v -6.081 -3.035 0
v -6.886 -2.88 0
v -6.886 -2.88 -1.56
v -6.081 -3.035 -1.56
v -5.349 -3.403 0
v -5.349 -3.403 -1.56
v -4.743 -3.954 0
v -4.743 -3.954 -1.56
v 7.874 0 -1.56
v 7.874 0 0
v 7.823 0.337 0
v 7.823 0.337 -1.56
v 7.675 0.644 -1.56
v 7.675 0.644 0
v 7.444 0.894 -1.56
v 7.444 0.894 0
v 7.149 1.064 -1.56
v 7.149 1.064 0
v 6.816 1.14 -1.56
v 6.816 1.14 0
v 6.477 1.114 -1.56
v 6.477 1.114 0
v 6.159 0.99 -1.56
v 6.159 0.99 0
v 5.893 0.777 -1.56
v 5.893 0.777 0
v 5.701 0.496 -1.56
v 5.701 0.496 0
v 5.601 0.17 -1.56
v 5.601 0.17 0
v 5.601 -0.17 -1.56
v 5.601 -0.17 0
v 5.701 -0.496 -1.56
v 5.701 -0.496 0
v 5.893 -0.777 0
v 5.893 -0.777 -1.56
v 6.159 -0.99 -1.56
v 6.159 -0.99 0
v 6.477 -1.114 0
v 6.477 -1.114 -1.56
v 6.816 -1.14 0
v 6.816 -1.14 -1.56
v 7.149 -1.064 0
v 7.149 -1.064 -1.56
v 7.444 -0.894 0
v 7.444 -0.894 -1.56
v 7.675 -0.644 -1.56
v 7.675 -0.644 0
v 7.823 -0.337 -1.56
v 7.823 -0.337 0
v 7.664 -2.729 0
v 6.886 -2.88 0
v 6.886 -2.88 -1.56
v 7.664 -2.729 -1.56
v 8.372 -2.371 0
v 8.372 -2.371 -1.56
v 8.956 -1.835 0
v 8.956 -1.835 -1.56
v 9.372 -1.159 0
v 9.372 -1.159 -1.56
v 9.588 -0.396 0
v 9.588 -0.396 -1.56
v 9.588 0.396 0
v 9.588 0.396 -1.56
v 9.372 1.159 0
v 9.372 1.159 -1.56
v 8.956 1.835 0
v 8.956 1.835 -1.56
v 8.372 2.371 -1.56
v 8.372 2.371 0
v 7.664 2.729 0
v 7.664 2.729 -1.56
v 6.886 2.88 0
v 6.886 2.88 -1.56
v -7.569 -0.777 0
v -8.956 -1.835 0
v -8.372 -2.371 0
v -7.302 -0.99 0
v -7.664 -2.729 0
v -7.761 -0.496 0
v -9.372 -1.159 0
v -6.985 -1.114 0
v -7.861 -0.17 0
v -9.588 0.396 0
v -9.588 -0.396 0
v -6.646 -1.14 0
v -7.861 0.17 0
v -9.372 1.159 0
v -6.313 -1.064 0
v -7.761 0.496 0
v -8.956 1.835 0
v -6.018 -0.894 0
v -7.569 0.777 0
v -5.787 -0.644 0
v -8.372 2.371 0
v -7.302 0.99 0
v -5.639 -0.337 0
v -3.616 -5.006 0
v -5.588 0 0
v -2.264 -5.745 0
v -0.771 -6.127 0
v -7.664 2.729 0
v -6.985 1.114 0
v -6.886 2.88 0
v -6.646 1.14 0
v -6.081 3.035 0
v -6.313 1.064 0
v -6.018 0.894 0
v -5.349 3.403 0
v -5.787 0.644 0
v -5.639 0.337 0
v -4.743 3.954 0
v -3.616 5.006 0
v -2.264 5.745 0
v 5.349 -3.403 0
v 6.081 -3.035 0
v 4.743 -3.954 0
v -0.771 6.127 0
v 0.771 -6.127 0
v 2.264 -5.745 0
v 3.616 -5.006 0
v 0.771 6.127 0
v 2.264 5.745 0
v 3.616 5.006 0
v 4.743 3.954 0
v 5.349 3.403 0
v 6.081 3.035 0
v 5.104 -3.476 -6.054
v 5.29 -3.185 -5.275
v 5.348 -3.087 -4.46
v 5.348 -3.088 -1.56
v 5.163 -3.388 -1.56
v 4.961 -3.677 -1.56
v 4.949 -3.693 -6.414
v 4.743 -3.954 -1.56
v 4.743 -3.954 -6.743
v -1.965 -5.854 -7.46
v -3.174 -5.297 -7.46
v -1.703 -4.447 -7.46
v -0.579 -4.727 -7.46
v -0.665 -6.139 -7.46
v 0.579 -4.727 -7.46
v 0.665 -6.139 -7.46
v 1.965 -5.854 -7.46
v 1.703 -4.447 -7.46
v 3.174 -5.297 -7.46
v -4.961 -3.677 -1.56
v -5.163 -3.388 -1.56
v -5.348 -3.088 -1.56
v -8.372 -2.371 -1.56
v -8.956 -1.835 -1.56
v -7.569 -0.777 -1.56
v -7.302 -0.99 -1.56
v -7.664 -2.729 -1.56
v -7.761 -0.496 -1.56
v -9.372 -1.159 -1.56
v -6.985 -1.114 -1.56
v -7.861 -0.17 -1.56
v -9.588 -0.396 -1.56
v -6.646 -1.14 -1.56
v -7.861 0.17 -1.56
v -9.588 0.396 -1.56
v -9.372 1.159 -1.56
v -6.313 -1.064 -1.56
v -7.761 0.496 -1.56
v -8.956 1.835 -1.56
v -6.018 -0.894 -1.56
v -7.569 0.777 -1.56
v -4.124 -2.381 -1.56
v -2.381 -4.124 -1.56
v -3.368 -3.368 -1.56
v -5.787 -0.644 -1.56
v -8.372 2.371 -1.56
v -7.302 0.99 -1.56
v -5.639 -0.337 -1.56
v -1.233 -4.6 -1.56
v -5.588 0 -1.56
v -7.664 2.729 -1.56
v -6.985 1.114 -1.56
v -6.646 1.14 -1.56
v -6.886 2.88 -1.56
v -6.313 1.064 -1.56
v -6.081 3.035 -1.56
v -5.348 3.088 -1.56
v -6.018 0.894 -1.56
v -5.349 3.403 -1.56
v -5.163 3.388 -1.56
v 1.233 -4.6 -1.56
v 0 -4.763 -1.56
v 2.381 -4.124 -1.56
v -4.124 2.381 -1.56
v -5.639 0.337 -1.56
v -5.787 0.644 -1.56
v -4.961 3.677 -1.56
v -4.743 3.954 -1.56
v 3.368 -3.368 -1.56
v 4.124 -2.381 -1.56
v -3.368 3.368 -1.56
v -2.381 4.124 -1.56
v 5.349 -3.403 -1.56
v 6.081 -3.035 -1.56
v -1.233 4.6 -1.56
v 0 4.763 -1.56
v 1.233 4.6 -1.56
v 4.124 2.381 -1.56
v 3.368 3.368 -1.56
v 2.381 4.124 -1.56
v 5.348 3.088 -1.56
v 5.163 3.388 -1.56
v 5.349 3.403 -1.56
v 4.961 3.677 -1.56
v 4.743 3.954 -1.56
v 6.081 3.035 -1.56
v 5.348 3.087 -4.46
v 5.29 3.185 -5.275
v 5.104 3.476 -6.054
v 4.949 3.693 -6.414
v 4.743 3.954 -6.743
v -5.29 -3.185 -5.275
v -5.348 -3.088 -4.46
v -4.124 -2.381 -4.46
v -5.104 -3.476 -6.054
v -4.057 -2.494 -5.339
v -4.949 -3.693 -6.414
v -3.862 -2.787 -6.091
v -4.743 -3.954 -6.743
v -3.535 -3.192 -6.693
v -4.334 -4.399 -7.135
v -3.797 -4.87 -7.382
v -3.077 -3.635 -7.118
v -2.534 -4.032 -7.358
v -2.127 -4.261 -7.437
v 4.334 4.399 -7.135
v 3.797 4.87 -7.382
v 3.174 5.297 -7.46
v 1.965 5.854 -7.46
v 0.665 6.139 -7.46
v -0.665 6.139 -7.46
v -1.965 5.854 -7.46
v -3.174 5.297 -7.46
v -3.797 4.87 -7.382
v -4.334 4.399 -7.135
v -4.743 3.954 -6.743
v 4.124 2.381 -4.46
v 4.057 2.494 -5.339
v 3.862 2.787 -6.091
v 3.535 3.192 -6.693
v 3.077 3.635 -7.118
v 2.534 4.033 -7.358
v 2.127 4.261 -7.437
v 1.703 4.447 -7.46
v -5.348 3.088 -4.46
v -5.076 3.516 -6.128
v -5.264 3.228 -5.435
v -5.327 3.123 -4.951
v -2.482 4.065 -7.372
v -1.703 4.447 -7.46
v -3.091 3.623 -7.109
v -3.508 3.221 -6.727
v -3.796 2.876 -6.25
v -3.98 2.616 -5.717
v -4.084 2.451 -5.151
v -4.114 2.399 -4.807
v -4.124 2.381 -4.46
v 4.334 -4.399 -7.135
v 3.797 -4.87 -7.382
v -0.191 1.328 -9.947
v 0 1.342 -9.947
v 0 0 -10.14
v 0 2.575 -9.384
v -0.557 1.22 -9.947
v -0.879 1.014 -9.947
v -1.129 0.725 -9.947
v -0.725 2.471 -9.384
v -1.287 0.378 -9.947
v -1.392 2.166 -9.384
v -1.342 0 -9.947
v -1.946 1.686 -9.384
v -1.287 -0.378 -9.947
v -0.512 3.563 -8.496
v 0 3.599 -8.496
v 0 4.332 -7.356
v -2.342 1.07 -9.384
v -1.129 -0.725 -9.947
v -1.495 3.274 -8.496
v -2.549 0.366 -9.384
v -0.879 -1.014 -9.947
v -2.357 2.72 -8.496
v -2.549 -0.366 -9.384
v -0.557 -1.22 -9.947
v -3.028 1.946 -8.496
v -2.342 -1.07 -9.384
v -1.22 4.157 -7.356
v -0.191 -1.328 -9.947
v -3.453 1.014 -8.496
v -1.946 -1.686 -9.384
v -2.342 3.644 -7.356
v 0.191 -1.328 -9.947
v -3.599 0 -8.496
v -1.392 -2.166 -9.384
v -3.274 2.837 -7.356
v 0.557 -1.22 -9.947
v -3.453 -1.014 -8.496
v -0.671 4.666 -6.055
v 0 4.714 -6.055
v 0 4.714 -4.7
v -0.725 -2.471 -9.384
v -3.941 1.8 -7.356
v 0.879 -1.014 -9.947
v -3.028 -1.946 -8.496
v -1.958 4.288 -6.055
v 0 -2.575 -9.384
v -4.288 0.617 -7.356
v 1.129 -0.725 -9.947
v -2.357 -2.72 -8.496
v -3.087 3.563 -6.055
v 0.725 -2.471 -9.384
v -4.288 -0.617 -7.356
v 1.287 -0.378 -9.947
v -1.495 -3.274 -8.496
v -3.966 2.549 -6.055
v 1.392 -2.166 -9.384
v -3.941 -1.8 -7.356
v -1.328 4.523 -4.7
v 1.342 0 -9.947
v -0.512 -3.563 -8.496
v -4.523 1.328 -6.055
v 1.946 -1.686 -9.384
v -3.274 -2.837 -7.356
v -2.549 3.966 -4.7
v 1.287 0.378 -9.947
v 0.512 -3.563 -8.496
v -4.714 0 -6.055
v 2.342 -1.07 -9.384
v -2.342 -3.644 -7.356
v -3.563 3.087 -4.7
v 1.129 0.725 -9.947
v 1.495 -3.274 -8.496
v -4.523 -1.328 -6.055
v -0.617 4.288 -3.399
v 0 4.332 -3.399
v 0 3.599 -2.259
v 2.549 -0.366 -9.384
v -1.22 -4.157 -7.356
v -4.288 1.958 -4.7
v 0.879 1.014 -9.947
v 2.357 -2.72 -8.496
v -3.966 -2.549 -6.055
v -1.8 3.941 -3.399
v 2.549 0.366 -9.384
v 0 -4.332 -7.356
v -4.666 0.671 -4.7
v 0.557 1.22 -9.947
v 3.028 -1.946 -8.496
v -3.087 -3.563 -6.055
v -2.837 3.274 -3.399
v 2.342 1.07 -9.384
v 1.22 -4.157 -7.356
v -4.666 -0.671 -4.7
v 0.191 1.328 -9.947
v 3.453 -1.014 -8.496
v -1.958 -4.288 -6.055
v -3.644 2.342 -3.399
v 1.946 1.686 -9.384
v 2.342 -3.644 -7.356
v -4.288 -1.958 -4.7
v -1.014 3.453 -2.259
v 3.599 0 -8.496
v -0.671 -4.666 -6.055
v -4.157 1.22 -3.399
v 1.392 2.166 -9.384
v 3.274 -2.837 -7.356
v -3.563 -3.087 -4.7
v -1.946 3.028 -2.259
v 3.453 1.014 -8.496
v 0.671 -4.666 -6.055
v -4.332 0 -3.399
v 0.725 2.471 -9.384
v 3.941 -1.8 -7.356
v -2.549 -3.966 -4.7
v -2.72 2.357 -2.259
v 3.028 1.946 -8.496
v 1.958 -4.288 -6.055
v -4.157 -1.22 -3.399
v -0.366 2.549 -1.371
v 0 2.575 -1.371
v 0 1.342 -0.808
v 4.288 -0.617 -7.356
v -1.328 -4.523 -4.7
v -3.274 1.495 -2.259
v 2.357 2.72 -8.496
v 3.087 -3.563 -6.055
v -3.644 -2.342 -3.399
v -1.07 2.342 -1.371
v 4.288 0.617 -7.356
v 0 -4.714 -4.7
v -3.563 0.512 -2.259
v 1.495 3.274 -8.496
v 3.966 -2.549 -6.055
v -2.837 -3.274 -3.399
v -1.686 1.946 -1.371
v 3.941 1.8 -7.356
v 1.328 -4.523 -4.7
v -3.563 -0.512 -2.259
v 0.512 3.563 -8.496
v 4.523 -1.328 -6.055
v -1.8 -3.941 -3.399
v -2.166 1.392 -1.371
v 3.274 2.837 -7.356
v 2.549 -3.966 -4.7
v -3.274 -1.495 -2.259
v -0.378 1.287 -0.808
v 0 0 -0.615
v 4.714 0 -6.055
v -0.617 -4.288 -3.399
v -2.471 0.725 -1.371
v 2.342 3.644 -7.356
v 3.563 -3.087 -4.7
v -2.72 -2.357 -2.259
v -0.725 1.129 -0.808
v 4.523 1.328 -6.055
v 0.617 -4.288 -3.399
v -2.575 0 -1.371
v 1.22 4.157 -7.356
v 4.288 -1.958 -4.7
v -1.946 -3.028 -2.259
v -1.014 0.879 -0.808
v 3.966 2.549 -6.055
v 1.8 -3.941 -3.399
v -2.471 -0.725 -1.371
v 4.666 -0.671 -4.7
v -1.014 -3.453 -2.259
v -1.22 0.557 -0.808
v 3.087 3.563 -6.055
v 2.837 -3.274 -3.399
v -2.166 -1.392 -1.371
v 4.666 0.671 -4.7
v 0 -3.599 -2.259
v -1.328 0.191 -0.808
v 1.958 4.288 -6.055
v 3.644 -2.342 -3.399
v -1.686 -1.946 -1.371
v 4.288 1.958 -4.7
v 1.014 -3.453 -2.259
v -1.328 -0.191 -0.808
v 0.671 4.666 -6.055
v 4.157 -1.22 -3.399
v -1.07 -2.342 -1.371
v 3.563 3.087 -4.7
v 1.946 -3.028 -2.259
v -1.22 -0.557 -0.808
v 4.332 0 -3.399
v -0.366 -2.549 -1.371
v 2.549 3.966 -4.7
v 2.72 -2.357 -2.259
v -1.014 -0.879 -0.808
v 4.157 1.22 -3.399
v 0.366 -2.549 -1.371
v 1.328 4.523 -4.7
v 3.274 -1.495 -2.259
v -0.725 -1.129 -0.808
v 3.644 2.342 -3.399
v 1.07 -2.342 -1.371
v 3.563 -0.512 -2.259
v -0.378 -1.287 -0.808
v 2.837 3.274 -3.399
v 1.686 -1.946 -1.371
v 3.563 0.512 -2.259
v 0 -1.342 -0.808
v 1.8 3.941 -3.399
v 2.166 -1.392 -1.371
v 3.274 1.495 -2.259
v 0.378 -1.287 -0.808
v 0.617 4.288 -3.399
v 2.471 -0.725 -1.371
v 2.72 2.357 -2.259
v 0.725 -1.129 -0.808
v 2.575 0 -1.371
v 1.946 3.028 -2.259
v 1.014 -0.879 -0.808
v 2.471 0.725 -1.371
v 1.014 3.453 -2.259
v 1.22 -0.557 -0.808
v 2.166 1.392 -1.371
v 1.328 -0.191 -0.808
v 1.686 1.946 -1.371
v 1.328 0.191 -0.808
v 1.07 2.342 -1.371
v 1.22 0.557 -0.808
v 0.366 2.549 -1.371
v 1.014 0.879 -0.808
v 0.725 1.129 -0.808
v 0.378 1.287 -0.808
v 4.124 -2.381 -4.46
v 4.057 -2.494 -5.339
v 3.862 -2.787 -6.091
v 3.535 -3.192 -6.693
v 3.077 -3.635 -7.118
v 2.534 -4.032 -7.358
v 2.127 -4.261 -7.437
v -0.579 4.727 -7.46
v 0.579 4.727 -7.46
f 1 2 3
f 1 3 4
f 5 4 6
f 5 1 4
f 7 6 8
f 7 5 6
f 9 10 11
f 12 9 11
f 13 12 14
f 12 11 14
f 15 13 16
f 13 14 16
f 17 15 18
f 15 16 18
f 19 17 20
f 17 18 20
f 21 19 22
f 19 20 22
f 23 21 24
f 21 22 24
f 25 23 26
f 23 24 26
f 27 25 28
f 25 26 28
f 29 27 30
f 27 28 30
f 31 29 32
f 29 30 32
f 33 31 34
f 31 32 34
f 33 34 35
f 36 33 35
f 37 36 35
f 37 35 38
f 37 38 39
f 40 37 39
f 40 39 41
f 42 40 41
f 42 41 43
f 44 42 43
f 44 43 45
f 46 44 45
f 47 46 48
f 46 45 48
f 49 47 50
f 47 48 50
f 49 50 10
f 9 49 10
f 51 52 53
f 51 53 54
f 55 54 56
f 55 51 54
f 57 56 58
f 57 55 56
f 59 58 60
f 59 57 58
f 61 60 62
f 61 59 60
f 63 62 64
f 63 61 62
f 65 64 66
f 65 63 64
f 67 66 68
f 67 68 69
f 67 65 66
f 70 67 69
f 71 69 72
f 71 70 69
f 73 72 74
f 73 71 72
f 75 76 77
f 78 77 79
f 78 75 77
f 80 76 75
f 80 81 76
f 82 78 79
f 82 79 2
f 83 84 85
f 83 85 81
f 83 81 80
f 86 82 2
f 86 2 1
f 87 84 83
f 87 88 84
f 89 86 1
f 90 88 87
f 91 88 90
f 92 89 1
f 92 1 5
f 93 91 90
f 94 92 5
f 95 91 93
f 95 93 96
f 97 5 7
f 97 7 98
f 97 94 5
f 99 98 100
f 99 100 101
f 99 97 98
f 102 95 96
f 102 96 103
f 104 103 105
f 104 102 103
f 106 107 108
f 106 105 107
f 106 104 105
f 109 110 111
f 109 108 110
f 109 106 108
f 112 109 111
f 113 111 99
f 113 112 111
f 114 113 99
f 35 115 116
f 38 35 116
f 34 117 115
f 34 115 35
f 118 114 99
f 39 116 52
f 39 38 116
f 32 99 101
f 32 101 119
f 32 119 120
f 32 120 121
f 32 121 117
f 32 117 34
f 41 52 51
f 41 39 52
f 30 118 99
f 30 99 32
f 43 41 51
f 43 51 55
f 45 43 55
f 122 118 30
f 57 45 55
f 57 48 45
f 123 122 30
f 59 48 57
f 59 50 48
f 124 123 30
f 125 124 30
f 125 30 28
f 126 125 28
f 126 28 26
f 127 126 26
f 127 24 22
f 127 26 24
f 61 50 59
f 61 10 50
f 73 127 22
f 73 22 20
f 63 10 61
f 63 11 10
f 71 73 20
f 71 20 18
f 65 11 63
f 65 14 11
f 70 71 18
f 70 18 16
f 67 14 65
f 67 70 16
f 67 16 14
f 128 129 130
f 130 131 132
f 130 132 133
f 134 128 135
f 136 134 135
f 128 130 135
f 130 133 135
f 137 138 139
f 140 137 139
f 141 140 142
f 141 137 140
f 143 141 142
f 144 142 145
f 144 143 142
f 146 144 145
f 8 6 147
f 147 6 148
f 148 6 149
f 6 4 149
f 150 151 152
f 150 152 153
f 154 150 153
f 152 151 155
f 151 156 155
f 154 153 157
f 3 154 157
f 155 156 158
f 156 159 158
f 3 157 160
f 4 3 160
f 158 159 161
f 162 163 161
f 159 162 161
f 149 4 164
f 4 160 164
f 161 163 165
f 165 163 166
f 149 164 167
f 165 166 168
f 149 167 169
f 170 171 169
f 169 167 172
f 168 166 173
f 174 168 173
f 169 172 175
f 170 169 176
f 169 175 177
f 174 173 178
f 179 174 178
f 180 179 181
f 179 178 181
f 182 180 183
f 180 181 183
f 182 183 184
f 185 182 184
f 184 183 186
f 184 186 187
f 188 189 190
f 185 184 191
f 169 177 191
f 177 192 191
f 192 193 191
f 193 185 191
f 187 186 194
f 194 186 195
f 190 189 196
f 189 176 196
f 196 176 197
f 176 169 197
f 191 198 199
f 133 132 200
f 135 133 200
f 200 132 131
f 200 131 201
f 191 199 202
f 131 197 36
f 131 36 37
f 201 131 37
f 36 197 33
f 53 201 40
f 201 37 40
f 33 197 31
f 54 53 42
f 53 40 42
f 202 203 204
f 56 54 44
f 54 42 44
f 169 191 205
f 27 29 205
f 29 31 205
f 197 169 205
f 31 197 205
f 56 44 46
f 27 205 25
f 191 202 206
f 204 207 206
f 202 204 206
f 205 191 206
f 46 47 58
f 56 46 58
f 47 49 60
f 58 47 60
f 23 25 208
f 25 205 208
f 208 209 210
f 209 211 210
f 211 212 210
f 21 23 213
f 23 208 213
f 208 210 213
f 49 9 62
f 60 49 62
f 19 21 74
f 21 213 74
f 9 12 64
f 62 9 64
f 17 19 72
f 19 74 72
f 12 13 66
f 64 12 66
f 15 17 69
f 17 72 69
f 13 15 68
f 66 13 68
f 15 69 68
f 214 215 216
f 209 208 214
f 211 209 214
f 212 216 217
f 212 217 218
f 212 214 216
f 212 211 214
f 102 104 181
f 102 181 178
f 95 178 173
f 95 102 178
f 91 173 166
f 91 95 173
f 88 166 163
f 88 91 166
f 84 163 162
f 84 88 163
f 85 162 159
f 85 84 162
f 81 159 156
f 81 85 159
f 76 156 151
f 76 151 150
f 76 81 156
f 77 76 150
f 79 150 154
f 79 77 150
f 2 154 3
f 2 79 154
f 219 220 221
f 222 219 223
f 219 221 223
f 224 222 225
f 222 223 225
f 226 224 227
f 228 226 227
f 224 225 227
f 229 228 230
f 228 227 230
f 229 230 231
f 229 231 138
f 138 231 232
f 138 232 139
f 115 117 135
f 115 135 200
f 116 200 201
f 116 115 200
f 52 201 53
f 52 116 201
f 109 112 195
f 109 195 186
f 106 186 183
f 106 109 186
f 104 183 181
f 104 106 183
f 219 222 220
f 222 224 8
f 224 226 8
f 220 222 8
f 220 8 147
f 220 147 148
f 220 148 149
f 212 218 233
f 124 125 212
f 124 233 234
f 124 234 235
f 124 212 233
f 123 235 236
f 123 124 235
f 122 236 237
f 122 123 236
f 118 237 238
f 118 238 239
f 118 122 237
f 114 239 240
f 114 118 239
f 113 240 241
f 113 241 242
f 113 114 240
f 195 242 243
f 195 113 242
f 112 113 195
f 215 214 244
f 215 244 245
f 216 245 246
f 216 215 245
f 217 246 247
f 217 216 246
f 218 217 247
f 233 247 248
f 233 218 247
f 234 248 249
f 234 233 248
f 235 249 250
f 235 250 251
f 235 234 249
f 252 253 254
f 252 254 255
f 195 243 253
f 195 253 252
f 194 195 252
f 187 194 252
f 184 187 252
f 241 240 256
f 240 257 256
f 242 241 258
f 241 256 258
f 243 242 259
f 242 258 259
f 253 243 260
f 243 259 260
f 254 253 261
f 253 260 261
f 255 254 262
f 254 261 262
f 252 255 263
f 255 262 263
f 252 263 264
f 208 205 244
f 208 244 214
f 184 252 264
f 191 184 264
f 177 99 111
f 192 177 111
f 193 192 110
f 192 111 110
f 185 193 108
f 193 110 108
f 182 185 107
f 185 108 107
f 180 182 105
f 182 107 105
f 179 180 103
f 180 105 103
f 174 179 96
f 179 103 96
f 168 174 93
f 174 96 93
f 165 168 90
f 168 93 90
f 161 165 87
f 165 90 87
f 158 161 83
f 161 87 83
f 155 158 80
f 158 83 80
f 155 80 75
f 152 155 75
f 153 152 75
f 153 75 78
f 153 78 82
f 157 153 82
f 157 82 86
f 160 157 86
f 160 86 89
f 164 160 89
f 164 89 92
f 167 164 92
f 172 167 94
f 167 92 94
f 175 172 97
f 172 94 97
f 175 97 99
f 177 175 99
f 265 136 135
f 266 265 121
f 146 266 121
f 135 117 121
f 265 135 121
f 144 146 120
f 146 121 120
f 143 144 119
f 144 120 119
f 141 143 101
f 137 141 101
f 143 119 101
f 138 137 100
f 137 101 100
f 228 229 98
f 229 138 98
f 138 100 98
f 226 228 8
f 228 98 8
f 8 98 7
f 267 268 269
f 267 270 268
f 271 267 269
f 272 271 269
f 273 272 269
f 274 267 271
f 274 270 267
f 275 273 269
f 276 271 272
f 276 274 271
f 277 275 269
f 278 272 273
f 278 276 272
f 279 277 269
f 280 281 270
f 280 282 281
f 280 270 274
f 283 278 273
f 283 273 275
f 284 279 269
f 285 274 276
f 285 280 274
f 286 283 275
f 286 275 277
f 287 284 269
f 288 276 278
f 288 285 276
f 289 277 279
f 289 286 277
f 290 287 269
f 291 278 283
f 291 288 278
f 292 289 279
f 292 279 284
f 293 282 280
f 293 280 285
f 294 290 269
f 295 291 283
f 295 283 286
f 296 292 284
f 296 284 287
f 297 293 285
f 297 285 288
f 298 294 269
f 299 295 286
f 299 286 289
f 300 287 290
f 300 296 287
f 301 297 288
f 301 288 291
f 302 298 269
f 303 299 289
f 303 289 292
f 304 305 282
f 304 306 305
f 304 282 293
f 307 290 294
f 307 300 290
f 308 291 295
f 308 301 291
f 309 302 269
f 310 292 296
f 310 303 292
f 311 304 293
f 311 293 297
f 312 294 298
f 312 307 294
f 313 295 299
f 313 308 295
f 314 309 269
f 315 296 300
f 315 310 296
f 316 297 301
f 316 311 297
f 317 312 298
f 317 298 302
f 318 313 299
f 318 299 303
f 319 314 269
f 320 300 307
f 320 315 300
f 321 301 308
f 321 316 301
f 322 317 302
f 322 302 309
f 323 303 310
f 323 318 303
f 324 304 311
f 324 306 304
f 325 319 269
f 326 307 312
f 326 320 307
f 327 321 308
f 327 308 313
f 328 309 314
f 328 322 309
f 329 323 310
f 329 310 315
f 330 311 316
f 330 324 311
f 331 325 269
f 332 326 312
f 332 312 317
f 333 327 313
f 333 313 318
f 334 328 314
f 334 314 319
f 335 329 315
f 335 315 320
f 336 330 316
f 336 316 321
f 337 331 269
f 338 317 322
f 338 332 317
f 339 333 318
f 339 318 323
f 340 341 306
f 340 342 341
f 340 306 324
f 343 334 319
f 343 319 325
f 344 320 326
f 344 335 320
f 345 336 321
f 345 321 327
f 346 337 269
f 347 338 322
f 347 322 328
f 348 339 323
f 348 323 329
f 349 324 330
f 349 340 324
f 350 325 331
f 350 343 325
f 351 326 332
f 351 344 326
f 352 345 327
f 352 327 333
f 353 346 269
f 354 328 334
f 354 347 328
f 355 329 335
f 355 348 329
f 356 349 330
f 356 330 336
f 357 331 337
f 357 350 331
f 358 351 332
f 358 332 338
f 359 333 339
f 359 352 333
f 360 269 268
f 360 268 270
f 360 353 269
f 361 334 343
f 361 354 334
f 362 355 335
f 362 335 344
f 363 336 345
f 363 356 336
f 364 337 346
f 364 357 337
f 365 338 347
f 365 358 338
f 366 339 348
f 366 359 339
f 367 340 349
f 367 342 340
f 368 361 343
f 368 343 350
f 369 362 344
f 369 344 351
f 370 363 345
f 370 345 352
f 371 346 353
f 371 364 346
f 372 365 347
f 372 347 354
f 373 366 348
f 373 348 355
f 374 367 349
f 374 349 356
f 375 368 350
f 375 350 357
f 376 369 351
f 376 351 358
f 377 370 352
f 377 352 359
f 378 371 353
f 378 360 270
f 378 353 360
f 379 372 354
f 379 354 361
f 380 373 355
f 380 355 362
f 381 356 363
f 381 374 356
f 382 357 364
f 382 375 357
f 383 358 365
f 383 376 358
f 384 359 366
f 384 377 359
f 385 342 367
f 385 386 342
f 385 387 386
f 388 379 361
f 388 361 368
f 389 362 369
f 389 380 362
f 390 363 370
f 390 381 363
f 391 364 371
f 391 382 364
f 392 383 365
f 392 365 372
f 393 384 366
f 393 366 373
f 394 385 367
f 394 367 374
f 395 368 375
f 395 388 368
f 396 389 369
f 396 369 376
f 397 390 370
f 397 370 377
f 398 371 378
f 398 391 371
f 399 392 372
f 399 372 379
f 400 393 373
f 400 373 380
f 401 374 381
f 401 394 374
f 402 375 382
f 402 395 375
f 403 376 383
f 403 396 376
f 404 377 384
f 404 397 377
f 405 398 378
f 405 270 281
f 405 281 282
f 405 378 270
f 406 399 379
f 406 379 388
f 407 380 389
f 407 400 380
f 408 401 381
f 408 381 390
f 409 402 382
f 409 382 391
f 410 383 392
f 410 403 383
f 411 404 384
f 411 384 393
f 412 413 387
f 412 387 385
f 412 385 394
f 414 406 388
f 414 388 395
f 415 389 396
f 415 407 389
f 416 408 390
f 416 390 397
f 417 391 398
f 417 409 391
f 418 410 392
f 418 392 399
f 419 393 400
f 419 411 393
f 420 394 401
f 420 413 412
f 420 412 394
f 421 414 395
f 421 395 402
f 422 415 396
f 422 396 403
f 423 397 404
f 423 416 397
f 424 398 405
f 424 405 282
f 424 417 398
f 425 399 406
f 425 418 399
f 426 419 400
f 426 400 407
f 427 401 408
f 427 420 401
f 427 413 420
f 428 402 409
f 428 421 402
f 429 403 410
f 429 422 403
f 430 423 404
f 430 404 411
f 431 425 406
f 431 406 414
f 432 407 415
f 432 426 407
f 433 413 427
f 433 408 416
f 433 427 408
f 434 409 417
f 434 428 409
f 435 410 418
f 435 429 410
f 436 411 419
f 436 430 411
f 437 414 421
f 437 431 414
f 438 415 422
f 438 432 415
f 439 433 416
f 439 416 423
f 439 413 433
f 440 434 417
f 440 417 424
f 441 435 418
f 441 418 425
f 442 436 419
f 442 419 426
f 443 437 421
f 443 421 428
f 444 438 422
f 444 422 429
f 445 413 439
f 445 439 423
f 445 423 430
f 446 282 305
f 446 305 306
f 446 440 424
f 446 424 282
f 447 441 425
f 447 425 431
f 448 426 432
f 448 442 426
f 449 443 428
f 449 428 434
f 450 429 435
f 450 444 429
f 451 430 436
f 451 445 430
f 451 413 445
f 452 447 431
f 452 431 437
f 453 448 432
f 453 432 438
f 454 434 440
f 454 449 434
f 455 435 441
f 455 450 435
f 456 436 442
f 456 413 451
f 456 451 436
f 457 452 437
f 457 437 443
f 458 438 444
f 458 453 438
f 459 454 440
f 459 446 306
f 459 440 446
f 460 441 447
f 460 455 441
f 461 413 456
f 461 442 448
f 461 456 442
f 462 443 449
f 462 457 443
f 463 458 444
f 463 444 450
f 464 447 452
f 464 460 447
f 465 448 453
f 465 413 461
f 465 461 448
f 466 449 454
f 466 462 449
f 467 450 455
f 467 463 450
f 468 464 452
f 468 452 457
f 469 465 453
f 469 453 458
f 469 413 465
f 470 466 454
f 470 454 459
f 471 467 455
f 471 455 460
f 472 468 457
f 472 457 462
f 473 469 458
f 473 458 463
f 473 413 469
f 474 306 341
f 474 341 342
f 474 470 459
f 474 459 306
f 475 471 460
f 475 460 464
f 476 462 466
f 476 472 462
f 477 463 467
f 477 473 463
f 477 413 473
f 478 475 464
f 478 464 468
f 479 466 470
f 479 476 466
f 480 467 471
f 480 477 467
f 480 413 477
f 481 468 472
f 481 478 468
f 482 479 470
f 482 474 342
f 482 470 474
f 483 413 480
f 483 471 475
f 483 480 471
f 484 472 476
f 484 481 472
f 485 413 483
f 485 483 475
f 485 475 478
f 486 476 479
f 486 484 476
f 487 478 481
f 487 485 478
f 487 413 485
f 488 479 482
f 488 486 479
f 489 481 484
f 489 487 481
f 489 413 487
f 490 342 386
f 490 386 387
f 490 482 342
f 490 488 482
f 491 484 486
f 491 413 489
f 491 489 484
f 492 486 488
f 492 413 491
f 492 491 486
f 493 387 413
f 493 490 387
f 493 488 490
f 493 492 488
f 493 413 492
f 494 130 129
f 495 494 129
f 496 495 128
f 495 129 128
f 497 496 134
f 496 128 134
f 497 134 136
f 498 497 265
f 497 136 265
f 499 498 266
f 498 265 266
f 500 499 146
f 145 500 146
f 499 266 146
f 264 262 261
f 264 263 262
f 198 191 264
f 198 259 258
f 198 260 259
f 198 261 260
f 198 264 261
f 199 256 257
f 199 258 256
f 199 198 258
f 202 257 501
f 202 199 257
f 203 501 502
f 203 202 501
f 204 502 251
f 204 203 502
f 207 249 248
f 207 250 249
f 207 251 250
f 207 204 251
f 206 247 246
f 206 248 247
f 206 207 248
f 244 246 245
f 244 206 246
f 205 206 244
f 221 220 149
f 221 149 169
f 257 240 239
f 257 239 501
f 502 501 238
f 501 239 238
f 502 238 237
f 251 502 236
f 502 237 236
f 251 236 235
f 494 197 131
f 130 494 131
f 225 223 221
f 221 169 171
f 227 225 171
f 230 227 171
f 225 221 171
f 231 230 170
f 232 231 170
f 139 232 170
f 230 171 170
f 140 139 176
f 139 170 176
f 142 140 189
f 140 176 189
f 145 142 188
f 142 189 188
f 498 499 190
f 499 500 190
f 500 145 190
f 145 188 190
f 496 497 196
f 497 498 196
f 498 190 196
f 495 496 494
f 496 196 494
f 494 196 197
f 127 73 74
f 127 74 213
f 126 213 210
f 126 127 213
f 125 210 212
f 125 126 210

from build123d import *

# Parameters (mm, degrees)
F0_R     = 1.143
F1_DEPTH = 1.56
F3_DEPTH = 5.9
F7_R     = 3


with BuildPart() as f1:
    # F0 (on Top) → F1 (new body)
    with BuildSketch(Plane.XY):
        with BuildLine():
            ThreePointArc((6.8858420035, 2.8798402654), (5.7022933213, 3.1937226824), (4.7427446214, 3.954364482))
            ThreePointArc((4.7427446214, 3.954364482), (0, 6.175), (-4.7427446214, 3.954364482))
            ThreePointArc((-4.7427446214, 3.954364482), (-5.7022933213, 3.1937226824), (-6.8858420035, 2.8798402654))
            ThreePointArc((-6.8858420035, 2.8798402654), (-9.615, 0), (-6.8858420035, -2.8798402654))
            ThreePointArc((-6.8858420035, -2.8798402654), (-5.7022933213, -3.1937226824), (-4.7427446214, -3.954364482))
            ThreePointArc((-4.7427446214, -3.954364482), (0, -6.175), (4.7427446214, -3.954364482))
            ThreePointArc((4.7427446214, -3.954364482), (5.7022933213, -3.1937226824), (6.8858420035, -2.8798402654))
            ThreePointArc((6.8858420035, -2.8798402654), (9.615, 0), (6.8858420035, 2.8798402654))
        make_face()
        with Locations((-6.731, 0)):
            Circle(F0_R, mode=Mode.SUBTRACT)
        with Locations((6.731, 0)):
            Circle(F0_R, mode=Mode.SUBTRACT)
    extrude(amount=-F1_DEPTH)

    # F2 (on face) → F3 (join)
    with BuildSketch(Plane(origin=(0, 0, -1.56), x_dir=(1, 0, 0), z_dir=(0, 0, -1))):
        with BuildLine():
            Line((4.1244459855, 2.38125), (5.3477068684, 3.0875))
            ThreePointArc((5.3477068684, 3.0875), (5.0638094676, 3.5339013393), (4.7427446214, 3.954364482))
            ThreePointArc((4.7427446214, 3.954364482), (0, 6.175), (-4.7427446214, 3.954364482))
            ThreePointArc((-4.7427446214, 3.954364482), (-5.0638094676, 3.5339013393), (-5.3477068684, 3.0875))
            Line((-5.3477068684, 3.0875), (-4.1244459855, 2.38125))
            ThreePointArc((-4.1244459855, 2.38125), (0, 4.7625), (4.1244459855, 2.38125))
        make_face()
    extrude(amount=F3_DEPTH)

    # F4: F1 across plane


with BuildPart() as f1_1:
    add(f1.part)
    add(f1.part.mirror(Plane.XZ))

    # F7
    f7_edges = [f1_1.edges().sort_by_distance(p)[0] for p in [
        (4.736076, 2.734375, -7.46),
        (4.736076, -2.734375, -7.46),
        (-4.736076, 2.734375, -7.46),
        (-4.736076, -2.734375, -7.46),
    ]]
    fillet(f7_edges, radius=F7_R)


with BuildPart() as f6:
    # F5 (on Right) → F6 (revolve)
    with BuildSketch(Plane.YZ):
        with BuildLine():
            Line((0, -0.615), (0, -10.14))
            ThreePointArc((0, -10.14), (4.7625, -5.3775), (0, -0.615))
        make_face()
    revolve(axis=Axis((0, 0, -5.3775), (0, 0, 1)))


solid = Compound([f1_1.part, f6.part])
